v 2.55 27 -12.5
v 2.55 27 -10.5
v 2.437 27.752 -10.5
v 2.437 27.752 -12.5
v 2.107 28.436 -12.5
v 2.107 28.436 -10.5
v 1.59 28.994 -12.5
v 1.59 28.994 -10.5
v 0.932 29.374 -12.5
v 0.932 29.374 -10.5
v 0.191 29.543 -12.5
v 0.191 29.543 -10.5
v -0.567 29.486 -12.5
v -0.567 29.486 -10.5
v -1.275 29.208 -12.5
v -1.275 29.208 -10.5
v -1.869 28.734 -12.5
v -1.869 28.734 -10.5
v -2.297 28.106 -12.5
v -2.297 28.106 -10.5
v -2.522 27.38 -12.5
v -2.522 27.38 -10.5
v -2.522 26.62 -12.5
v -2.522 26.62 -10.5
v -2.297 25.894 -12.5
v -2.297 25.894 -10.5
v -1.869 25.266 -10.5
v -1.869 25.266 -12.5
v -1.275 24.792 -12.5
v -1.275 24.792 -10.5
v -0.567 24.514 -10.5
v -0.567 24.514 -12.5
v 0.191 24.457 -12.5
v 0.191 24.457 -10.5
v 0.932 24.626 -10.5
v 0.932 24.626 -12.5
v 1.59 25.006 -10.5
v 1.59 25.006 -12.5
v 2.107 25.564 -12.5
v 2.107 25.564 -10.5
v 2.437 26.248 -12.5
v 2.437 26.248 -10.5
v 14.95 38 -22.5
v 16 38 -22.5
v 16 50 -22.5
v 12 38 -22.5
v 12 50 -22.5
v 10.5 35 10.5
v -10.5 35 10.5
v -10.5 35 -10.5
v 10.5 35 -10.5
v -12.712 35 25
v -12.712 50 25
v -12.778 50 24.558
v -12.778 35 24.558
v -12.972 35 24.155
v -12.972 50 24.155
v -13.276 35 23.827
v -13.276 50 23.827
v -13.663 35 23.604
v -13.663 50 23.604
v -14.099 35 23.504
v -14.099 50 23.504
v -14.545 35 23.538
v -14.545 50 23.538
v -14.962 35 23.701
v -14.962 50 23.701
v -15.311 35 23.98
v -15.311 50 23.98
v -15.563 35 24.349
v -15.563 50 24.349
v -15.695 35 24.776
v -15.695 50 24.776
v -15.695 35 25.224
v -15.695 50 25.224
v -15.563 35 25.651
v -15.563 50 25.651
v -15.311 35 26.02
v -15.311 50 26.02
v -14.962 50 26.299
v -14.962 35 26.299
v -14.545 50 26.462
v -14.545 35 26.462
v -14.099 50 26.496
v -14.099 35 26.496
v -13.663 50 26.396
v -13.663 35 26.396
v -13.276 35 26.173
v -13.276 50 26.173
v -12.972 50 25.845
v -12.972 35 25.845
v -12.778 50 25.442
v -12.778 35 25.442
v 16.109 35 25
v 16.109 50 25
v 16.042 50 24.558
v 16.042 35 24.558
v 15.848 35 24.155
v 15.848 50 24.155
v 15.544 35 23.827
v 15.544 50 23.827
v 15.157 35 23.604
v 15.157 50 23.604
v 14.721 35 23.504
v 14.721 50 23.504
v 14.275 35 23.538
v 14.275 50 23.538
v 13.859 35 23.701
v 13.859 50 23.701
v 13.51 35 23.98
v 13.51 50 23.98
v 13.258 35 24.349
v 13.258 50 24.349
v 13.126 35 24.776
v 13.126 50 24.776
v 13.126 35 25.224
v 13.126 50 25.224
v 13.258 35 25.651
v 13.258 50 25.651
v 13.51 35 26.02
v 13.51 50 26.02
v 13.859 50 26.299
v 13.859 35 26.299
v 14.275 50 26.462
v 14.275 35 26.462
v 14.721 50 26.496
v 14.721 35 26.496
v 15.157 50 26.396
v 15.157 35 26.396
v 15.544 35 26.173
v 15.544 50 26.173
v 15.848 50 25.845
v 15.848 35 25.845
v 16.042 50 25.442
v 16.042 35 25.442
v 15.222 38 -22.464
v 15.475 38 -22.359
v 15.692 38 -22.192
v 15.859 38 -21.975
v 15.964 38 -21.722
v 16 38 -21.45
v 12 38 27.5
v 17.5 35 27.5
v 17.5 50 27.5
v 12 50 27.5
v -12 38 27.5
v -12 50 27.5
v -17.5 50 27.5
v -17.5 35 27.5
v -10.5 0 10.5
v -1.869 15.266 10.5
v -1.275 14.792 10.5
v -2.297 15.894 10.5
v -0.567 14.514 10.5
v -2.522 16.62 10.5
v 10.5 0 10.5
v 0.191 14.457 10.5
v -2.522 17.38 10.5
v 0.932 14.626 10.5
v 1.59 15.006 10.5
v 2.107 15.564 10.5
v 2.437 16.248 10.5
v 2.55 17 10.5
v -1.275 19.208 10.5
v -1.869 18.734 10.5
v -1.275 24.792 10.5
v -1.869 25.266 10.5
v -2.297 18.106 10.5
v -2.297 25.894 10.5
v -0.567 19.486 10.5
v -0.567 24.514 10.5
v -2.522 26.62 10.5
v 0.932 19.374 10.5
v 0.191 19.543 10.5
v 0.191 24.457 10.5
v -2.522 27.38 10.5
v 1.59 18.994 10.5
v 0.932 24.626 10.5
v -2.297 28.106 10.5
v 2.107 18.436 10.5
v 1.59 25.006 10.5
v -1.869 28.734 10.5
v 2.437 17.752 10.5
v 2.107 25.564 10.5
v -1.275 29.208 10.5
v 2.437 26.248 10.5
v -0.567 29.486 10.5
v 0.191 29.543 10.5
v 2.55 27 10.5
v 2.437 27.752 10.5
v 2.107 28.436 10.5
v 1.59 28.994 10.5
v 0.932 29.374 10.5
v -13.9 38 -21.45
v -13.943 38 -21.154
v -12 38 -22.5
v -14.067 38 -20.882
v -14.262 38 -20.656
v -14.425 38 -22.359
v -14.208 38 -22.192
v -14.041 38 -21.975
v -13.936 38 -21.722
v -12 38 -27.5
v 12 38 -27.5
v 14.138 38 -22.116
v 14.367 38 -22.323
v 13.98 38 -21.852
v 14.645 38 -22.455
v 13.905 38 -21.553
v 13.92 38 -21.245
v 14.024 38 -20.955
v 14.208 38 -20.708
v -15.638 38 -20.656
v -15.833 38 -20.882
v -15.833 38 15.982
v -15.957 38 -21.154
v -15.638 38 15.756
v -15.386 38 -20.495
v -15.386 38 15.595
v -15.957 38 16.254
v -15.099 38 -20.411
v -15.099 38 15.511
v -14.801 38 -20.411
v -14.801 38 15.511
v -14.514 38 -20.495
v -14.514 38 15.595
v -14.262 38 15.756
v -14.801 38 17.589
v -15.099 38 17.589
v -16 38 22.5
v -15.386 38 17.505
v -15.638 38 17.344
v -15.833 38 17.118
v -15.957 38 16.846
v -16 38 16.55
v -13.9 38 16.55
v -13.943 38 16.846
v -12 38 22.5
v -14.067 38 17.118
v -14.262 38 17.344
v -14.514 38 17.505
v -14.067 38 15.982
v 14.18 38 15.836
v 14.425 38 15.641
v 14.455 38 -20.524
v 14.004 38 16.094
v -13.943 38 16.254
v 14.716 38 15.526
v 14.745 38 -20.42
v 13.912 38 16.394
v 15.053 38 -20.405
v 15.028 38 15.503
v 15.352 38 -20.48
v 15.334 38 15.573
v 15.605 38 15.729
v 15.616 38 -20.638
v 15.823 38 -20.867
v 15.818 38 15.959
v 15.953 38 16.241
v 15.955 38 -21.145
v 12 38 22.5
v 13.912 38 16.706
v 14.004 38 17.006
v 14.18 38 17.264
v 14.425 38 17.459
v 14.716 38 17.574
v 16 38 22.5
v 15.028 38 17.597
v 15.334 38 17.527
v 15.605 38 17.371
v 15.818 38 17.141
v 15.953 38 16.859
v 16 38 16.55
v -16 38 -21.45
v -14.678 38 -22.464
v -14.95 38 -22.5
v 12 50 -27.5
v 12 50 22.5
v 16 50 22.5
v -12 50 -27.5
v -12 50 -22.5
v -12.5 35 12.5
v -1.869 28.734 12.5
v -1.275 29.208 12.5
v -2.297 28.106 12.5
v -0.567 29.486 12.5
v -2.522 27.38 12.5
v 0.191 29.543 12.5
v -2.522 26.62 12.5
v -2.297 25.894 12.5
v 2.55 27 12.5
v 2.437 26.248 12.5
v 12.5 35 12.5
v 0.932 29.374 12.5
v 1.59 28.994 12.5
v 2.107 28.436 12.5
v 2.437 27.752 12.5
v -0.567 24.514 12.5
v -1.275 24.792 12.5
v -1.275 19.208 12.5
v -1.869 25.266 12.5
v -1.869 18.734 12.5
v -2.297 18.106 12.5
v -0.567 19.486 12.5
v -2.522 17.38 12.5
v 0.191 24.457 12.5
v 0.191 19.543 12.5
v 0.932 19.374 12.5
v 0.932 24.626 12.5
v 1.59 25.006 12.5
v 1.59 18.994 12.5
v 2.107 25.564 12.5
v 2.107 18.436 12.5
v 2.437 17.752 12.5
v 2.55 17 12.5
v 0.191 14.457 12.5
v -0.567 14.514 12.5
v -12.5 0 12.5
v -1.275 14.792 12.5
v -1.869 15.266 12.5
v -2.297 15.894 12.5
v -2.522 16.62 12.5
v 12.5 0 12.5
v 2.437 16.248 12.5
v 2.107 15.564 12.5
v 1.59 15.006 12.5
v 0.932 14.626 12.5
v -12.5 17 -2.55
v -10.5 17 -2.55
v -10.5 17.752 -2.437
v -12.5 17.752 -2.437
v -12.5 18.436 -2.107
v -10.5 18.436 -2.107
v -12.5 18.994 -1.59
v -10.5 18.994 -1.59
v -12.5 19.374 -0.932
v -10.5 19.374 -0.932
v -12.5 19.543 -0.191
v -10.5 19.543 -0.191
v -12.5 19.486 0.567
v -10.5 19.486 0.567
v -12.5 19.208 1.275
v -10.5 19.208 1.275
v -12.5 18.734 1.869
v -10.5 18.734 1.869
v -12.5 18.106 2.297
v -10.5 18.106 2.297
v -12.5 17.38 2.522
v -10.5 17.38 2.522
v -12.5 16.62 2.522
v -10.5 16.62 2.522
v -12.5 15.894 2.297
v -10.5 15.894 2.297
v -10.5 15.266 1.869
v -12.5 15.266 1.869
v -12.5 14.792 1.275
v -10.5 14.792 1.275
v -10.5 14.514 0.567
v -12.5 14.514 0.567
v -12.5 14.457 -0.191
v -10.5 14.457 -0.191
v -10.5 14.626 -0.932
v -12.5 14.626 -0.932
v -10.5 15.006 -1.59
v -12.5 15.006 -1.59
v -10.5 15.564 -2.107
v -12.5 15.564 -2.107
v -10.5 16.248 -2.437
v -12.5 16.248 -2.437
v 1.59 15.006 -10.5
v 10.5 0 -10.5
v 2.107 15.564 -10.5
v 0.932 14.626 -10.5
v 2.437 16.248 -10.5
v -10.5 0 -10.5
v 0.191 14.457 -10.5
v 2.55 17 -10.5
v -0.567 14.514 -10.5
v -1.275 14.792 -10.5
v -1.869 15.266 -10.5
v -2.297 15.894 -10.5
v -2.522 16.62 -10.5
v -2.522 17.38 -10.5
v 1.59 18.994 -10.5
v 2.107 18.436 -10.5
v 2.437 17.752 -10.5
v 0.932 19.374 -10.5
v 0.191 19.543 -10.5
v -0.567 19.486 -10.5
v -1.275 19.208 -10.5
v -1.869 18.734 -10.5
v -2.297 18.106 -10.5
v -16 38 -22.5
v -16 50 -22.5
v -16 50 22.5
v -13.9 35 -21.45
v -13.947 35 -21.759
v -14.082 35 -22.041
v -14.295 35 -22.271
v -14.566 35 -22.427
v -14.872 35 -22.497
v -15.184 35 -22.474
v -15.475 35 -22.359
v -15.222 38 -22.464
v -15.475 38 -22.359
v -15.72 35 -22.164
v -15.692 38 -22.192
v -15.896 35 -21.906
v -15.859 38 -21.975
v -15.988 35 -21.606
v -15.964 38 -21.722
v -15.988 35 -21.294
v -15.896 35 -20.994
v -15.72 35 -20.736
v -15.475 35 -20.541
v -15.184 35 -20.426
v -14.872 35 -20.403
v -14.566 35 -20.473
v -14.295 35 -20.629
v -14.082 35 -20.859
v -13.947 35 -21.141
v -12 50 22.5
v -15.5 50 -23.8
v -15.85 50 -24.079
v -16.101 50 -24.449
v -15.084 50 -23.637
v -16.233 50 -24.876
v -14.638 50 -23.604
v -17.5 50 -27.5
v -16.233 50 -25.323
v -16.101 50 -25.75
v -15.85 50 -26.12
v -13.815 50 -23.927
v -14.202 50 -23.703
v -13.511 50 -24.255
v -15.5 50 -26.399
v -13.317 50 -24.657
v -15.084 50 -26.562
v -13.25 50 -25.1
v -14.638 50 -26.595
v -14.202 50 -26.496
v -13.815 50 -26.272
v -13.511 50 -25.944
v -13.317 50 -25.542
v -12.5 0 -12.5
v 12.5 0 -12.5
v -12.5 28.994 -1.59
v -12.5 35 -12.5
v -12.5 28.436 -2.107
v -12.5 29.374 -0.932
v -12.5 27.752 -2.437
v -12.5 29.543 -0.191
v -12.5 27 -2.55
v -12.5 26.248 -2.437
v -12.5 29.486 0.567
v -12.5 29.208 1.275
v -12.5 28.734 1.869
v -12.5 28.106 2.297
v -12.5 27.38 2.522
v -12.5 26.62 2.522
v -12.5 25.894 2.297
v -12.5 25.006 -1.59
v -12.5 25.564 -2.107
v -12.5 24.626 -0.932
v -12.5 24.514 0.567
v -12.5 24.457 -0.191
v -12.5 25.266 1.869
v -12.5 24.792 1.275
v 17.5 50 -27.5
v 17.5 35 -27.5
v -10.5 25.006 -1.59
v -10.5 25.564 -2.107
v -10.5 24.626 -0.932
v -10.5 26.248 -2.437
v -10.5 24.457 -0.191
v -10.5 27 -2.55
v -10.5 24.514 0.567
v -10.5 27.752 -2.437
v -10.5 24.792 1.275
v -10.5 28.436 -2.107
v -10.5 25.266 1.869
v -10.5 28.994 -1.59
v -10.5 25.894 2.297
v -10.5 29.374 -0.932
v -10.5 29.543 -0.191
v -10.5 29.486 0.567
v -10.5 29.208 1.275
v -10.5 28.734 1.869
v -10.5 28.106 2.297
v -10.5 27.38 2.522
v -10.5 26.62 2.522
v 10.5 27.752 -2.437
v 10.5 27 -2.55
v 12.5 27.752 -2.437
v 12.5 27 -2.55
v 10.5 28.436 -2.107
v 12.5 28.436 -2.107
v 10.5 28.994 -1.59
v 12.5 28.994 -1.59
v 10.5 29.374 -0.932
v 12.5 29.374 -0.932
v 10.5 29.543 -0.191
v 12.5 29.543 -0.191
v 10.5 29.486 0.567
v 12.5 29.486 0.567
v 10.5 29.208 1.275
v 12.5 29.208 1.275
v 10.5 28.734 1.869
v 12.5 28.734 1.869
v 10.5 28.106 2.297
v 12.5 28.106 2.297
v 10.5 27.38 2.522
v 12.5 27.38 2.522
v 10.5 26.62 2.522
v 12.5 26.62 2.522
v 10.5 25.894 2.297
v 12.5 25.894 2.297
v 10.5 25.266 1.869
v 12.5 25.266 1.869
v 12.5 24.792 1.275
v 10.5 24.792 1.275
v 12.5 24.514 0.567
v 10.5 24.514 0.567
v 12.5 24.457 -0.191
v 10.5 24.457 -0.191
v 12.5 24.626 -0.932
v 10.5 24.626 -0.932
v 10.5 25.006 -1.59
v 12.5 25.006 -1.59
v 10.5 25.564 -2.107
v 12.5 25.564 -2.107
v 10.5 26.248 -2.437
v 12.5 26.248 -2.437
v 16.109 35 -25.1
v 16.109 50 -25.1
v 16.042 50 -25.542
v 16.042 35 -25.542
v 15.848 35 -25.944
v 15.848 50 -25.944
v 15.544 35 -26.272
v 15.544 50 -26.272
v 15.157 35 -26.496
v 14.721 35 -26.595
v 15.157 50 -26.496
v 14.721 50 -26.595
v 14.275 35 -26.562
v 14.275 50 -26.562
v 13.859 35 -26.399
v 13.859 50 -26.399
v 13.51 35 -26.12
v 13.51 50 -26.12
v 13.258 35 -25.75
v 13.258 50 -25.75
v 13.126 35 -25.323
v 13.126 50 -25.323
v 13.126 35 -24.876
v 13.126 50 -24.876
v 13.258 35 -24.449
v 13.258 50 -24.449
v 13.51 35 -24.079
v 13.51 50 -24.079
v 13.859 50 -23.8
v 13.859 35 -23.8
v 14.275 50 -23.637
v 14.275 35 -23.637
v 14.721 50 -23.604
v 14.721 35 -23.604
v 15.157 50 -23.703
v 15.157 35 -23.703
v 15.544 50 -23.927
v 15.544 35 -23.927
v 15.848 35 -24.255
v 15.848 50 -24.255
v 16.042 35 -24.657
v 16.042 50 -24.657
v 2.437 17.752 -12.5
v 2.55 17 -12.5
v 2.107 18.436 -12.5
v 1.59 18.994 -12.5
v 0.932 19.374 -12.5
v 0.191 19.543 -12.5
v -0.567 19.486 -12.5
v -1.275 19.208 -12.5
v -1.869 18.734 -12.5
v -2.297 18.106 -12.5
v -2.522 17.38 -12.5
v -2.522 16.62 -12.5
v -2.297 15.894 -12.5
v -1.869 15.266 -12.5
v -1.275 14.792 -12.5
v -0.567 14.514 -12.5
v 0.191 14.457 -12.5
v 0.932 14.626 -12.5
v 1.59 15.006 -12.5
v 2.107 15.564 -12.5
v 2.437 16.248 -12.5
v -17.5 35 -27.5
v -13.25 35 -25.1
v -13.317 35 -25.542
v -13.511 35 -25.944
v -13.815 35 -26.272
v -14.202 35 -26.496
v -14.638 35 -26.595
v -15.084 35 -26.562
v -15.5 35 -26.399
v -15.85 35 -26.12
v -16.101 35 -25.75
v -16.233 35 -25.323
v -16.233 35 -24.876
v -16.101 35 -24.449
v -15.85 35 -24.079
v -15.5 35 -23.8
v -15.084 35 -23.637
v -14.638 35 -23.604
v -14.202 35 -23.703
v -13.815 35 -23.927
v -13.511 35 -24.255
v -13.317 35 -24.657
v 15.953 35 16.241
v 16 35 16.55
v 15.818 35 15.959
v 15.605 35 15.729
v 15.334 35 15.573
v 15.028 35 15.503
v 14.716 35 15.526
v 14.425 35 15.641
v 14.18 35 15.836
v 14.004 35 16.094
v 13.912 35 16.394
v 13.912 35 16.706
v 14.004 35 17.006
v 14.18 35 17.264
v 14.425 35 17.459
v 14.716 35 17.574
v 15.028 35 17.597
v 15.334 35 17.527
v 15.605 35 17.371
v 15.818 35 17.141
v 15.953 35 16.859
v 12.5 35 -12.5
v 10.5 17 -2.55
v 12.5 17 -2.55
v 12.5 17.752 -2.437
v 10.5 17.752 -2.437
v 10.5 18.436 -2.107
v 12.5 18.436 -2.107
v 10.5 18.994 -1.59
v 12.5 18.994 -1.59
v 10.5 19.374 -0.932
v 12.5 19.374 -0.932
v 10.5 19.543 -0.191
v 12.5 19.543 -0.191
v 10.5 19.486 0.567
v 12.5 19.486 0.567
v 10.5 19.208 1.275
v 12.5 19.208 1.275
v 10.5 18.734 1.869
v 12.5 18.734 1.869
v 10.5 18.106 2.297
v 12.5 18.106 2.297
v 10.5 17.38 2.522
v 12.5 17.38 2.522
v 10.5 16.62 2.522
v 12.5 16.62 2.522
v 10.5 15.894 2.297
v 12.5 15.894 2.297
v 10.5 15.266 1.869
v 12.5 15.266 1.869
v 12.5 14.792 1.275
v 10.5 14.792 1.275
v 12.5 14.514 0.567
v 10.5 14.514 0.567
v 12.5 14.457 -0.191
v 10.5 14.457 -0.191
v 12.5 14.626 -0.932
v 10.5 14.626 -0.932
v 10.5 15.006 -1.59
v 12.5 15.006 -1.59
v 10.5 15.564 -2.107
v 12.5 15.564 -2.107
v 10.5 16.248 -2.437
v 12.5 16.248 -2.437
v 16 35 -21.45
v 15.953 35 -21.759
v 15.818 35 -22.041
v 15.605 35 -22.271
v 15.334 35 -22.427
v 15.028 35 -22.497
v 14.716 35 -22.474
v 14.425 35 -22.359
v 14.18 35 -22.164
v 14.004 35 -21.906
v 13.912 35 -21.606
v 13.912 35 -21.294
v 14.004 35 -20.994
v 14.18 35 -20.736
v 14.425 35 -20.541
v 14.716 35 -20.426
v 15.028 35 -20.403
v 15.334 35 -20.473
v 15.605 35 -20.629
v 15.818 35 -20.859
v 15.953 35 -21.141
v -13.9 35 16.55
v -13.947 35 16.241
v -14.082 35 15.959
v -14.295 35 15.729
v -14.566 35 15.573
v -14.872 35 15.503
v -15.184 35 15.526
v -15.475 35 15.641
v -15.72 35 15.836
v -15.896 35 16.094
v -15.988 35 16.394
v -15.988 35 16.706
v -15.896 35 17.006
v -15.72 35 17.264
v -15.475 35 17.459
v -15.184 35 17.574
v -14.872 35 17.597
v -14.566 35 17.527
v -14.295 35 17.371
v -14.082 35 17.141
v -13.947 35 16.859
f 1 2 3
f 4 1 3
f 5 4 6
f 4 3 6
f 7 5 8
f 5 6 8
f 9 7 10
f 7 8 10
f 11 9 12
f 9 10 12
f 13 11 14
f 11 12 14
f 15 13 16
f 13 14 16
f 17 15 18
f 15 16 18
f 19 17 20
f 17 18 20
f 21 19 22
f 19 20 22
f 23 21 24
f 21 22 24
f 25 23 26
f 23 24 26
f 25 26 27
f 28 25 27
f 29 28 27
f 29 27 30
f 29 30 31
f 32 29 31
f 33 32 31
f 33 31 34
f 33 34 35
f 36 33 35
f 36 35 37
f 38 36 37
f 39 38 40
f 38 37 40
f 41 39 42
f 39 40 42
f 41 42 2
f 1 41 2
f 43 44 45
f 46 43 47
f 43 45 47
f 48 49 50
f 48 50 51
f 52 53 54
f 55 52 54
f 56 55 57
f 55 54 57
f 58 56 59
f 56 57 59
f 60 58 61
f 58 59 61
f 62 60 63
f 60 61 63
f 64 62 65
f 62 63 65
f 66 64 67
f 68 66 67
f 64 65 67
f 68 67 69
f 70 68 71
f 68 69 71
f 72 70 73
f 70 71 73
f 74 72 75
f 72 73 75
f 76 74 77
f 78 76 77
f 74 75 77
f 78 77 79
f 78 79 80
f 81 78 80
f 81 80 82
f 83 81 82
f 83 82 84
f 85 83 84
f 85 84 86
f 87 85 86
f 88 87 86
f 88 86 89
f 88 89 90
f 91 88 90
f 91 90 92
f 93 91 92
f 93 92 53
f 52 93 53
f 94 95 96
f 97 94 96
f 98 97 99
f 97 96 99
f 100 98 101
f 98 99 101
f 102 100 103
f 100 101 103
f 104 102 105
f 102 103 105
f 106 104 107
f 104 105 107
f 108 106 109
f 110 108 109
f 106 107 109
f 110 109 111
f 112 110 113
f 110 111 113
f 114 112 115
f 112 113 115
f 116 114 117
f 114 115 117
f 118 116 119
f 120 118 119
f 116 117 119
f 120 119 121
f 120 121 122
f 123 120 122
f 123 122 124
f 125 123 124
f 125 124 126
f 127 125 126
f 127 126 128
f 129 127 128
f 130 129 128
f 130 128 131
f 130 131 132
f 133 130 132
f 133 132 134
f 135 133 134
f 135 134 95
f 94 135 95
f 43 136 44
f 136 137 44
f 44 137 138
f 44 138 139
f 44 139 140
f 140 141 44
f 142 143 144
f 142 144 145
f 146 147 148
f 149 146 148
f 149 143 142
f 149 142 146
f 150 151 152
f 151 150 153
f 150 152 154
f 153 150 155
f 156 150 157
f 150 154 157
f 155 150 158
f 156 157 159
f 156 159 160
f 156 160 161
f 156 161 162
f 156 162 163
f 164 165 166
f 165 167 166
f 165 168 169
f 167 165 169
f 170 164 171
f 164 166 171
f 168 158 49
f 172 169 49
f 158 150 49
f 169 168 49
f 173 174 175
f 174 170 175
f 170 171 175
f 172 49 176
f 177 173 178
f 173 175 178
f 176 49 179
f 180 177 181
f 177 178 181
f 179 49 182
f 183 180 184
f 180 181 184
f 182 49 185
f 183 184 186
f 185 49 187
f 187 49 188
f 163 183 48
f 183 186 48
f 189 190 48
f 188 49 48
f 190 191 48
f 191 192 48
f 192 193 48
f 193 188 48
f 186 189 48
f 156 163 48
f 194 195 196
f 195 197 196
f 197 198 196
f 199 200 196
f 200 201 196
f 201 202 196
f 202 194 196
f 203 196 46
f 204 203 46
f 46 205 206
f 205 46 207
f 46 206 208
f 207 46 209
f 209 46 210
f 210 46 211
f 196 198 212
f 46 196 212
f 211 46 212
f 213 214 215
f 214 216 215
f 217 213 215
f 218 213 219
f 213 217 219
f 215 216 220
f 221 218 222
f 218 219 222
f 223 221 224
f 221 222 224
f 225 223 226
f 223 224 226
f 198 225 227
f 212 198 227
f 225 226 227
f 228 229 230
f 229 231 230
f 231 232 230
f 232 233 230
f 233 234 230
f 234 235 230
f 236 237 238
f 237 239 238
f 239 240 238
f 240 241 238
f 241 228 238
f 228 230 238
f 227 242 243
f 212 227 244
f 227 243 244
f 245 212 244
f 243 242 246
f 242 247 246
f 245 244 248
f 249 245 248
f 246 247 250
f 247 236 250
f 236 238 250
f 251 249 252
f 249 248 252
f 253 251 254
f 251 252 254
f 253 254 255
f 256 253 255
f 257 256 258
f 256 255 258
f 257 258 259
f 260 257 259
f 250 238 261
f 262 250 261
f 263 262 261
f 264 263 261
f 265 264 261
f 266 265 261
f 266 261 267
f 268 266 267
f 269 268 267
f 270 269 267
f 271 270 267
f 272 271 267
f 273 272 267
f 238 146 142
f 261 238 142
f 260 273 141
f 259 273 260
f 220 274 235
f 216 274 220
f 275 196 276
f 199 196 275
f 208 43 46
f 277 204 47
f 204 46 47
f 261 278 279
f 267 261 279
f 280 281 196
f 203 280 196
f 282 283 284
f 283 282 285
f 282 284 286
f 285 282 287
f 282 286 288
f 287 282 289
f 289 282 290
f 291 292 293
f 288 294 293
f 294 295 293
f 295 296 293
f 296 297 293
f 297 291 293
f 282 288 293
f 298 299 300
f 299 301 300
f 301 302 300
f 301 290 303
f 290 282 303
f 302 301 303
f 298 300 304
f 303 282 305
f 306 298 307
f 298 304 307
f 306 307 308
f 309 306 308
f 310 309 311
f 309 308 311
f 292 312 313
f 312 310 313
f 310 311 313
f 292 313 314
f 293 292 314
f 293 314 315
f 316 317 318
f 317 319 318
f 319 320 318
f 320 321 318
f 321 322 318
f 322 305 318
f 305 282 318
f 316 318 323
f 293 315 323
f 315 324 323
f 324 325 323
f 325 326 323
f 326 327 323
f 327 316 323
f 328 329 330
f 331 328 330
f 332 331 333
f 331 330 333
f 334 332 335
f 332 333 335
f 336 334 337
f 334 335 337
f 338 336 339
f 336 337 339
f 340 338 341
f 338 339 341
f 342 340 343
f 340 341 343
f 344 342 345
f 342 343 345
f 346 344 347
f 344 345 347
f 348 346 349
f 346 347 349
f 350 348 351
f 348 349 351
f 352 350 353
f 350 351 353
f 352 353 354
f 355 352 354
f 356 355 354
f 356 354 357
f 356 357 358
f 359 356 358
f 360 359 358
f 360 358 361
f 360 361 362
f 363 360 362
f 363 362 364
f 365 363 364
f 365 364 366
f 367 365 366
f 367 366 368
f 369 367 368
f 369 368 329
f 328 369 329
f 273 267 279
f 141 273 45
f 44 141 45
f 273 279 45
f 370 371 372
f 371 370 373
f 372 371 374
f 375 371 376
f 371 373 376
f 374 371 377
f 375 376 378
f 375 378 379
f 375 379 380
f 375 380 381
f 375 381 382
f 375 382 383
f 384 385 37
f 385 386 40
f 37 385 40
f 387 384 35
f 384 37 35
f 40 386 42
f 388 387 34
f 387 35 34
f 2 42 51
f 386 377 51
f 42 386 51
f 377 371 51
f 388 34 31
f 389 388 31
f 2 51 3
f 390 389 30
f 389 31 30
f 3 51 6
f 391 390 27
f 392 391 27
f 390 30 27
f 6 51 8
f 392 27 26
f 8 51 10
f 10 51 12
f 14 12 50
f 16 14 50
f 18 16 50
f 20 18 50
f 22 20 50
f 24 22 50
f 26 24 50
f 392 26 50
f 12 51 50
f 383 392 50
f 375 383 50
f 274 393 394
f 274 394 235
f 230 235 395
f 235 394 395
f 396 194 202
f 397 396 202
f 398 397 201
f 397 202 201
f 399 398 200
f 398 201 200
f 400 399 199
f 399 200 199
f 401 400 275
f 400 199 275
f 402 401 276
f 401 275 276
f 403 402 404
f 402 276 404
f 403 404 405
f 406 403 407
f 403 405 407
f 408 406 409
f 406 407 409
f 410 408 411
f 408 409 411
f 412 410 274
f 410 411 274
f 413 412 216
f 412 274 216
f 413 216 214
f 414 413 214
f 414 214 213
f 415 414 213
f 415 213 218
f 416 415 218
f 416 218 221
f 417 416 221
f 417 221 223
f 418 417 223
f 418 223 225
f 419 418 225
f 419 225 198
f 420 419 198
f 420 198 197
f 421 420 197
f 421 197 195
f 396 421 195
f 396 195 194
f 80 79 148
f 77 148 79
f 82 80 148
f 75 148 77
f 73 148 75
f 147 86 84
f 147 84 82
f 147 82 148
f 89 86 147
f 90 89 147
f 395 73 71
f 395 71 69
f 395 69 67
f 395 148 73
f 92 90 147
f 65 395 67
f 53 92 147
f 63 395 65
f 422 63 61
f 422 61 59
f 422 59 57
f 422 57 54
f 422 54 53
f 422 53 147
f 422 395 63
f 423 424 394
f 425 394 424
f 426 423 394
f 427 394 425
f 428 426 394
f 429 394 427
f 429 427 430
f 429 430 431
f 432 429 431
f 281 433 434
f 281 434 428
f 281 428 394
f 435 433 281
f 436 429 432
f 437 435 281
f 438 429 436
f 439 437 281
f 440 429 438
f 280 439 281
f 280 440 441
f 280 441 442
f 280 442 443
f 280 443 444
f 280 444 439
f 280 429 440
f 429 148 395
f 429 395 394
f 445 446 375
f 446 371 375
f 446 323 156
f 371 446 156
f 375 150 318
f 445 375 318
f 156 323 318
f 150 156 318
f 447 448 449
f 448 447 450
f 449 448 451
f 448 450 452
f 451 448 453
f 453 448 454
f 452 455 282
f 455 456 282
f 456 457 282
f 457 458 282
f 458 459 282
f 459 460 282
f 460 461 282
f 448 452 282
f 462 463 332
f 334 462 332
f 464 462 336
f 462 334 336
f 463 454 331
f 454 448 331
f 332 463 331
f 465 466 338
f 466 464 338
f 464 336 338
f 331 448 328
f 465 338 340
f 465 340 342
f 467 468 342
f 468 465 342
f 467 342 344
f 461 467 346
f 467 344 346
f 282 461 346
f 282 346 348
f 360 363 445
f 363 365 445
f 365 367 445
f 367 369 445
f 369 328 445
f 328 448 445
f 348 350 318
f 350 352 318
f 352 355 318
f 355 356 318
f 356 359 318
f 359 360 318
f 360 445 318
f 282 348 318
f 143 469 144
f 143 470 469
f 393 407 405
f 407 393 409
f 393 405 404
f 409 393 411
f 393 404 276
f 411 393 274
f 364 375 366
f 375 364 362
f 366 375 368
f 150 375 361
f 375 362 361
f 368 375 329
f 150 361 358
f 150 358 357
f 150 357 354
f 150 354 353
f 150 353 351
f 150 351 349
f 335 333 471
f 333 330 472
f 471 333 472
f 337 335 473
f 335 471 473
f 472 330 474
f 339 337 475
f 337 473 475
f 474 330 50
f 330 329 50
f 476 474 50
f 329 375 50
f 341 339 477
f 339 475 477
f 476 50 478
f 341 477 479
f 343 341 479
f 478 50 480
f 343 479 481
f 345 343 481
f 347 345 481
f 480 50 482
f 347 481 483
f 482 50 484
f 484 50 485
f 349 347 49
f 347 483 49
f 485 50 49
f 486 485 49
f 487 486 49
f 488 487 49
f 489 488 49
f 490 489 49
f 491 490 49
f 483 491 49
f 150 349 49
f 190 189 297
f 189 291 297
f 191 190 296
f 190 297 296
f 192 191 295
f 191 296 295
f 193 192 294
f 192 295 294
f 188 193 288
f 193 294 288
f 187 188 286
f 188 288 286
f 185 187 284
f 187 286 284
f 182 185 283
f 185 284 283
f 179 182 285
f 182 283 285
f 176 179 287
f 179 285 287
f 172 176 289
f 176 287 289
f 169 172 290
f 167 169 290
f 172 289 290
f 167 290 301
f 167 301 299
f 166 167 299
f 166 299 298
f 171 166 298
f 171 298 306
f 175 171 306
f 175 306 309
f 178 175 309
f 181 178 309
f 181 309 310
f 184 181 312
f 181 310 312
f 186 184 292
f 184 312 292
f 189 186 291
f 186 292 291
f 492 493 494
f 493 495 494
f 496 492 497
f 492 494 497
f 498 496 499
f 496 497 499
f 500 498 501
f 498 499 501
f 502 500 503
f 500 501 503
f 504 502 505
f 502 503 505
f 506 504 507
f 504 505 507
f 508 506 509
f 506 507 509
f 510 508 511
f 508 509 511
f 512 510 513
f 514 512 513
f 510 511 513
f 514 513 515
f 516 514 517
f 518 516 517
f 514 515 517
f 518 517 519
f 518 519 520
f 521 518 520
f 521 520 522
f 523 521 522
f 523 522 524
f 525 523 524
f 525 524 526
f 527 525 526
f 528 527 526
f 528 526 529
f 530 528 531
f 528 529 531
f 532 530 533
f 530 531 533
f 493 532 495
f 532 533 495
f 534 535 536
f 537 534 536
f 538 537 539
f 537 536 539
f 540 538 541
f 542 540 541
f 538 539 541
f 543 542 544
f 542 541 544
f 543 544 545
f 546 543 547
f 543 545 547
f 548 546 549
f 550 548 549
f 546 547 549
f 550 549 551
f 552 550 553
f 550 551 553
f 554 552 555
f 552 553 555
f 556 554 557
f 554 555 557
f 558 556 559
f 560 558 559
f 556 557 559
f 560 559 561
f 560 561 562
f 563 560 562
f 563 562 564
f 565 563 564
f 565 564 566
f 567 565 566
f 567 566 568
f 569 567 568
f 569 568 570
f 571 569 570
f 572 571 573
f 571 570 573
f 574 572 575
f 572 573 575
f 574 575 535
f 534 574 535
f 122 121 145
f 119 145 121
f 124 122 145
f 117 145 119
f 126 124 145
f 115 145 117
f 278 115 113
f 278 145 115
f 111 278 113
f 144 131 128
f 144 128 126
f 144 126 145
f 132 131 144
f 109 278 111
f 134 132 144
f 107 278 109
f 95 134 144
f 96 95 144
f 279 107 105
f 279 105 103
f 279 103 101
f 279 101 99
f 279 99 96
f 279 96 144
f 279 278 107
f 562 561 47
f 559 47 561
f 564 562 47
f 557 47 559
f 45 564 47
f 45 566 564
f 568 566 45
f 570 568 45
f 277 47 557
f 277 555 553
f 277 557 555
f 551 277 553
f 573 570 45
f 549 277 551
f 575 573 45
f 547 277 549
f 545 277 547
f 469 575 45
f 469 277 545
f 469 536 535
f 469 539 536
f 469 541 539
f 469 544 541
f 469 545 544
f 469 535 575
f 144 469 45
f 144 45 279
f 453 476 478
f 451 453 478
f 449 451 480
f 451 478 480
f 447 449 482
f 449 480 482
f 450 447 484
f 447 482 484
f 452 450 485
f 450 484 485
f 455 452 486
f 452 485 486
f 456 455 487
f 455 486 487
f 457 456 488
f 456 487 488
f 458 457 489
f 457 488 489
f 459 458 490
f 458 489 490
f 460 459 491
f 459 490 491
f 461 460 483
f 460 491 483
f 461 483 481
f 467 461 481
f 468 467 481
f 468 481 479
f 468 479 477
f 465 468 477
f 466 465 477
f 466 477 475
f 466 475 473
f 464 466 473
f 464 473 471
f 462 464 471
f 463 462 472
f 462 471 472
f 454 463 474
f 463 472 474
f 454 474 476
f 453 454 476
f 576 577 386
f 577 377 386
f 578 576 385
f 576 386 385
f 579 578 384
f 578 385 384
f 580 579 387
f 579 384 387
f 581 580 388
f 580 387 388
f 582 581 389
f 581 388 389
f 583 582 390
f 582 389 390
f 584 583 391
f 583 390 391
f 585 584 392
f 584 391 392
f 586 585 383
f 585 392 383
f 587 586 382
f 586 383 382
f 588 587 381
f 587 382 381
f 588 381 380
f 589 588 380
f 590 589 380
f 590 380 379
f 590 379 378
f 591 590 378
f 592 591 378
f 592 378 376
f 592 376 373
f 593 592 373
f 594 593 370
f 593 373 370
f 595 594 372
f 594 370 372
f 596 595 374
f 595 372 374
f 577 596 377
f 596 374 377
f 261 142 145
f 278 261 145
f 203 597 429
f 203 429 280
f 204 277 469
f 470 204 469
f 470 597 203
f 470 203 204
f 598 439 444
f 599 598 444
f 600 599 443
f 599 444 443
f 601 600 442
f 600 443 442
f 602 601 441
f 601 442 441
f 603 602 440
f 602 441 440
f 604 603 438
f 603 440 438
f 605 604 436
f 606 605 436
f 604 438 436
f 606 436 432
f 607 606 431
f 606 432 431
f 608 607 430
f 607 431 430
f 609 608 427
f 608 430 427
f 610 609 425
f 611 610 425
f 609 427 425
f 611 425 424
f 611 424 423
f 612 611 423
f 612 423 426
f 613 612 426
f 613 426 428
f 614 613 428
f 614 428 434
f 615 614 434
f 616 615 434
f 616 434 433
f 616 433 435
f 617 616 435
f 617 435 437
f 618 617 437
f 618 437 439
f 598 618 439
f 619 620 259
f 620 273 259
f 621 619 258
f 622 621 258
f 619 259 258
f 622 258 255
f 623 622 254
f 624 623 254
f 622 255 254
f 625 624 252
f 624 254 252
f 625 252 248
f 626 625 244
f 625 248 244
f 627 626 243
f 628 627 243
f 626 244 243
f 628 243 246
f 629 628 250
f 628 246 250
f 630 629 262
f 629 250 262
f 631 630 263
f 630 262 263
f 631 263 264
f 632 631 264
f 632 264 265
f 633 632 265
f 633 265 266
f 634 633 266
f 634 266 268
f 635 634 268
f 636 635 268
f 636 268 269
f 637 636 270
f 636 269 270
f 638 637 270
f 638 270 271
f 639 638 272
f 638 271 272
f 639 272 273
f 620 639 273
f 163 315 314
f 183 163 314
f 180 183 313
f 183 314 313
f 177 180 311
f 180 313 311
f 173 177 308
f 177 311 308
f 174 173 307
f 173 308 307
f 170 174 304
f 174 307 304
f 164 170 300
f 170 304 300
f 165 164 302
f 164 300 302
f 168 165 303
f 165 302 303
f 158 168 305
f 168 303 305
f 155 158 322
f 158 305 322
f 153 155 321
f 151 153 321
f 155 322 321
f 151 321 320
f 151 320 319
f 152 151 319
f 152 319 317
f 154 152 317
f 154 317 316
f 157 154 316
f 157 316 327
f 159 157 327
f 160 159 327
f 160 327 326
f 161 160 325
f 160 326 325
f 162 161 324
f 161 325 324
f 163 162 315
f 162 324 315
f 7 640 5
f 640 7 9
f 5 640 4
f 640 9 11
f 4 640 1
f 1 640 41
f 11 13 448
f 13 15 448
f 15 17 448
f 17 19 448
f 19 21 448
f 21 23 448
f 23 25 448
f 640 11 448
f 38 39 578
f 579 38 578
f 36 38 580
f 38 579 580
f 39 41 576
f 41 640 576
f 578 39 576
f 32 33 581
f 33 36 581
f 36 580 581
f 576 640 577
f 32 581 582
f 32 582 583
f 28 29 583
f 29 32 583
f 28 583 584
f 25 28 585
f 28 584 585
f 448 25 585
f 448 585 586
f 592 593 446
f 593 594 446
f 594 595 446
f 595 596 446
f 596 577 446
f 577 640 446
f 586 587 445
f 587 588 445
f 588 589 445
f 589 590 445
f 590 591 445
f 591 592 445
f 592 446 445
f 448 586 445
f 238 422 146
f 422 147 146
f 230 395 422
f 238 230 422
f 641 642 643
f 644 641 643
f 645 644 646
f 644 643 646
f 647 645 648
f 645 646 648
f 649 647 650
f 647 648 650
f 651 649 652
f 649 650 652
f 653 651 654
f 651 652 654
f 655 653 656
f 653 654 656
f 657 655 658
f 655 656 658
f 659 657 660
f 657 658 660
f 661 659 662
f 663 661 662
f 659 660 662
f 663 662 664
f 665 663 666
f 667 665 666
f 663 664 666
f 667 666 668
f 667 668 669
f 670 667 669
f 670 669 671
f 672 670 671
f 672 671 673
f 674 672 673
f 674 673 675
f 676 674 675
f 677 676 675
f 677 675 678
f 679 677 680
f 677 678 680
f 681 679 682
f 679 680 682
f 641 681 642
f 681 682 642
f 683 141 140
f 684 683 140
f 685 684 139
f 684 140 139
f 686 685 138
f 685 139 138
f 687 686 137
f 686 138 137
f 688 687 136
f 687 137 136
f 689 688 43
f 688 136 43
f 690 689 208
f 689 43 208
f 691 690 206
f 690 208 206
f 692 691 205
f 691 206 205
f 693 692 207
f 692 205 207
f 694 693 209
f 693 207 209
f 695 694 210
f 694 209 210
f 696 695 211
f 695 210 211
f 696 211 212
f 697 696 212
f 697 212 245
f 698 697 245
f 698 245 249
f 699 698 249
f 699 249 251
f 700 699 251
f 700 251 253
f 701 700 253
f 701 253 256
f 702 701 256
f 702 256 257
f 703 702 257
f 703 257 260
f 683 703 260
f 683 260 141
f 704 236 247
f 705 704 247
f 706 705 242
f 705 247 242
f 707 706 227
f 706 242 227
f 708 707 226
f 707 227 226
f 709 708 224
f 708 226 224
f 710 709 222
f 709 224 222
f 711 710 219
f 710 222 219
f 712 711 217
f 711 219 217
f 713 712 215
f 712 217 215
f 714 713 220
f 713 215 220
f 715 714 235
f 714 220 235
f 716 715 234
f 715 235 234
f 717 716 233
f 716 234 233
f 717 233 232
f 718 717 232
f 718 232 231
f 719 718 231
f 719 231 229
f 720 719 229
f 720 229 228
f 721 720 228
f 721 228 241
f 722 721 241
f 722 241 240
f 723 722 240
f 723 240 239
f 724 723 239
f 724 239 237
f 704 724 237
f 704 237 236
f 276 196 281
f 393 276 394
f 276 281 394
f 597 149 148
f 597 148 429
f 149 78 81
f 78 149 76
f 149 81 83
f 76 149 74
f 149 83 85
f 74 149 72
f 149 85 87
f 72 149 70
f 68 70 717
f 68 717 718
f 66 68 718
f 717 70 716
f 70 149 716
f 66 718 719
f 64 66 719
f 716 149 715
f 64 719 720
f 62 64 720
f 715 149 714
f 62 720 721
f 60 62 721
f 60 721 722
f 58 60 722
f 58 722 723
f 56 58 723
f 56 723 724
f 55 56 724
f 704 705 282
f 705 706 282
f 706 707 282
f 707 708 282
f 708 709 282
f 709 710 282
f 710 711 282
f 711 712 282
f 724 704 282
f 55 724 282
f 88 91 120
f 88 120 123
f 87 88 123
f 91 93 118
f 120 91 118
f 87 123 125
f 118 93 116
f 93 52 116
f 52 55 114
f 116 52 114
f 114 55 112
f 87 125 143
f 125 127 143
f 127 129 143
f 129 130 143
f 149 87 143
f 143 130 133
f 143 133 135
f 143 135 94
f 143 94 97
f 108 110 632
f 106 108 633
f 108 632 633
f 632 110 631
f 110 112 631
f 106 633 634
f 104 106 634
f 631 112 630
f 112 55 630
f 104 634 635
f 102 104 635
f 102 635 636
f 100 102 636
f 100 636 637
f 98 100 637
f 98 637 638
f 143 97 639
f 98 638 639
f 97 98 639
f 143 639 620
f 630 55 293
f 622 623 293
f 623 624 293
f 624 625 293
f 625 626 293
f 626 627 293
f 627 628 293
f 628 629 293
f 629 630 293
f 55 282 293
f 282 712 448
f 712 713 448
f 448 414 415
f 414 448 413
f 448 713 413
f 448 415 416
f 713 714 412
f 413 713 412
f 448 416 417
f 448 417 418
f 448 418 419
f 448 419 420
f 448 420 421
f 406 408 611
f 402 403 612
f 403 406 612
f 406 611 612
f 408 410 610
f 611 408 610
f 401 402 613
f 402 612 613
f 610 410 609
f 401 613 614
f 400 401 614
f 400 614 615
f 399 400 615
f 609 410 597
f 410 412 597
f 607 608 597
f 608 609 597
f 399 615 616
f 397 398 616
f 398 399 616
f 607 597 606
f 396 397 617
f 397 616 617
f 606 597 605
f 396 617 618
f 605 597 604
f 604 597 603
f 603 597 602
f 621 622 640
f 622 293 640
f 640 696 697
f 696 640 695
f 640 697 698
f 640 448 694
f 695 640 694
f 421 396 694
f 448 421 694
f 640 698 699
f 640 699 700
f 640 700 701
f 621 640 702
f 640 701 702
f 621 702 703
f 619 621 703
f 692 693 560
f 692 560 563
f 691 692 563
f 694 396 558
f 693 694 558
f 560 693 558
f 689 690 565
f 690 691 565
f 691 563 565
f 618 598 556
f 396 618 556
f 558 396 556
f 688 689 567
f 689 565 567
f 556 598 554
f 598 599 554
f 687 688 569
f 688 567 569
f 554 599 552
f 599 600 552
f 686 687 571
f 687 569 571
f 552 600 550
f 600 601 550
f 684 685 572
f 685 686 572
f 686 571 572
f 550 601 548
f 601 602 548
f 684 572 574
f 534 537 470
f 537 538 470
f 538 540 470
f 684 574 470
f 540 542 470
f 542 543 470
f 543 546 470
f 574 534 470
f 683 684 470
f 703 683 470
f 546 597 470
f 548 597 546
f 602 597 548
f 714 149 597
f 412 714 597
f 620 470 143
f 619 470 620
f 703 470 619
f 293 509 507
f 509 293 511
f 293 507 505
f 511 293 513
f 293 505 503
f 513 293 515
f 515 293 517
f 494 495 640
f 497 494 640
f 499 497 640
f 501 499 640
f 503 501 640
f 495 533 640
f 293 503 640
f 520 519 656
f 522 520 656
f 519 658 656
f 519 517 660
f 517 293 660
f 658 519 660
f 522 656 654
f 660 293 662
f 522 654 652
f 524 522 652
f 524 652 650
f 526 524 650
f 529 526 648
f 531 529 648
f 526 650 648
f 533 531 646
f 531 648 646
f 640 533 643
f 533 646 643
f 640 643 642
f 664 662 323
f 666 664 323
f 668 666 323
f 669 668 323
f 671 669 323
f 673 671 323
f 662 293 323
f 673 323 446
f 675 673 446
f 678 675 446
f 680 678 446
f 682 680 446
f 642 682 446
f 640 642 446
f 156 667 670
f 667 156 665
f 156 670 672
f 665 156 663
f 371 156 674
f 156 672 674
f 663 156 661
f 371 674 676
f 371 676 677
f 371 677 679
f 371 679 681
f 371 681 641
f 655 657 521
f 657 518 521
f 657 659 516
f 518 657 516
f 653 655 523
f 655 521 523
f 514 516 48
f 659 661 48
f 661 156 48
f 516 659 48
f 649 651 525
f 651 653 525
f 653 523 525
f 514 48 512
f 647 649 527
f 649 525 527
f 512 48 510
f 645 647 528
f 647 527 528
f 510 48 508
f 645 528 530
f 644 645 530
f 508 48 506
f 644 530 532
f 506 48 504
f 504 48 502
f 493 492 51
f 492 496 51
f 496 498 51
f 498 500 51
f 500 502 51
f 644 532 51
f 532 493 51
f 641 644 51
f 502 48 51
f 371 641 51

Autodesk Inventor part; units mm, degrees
ref_plane "YZ Plane" through (0, 0, 0) normal (1, 0, 0) x (0, 1, 0)
ref_plane "XZ Plane" through (0, 0, 0) normal (0, 1, 0) x (-1, 0, 0)
ref_plane "XY Plane" through (0, 0, 0) normal (0, 0, 1) x (1, 0, 0)
sketch "草圖1" plane through (0, 0, 0) normal (0, 1, 0) x (-1, 0, 0)
  line L0 (12.5, 12.5) -> (-12.5, 12.5)
  line L1 (-12.5, 12.5) -> (-12.5, -12.5)
  line L2 (-12.5, -12.5) -> (12.5, -12.5)
  line L3 (12.5, -12.5) -> (12.5, 12.5)
  line L4 (12.5, 12.5) -> (-12.5, -12.5) construction
  line L5 (-12.5, 12.5) -> (12.5, -12.5) construction
  point P0 (0, 0)
  dimension "d0" = 25
  dimension "d1" = 25
extrude "擠出1" add sketch "草圖1" along normal blind 35
sketch "草圖2" plane through (0, 35, 0) normal (0, 1, 0) x (1, 0, 0)
  line L0 (-10.5, -10.5) -> (10.5, -10.5)
  line L1 (10.5, -10.5) -> (10.5, 10.5)
  line L2 (10.5, 10.5) -> (-10.5, 10.5)
  line L3 (-10.5, 10.5) -> (-10.5, -10.5)
  line L4 (-10.5, -10.5) -> (10.5, 10.5) construction
  line L5 (10.5, -10.5) -> (-10.5, 10.5) construction
  point P0 (0, 0)
  dimension "d4" = 21
  dimension "d5" = 21
extrude "擠出2" cut sketch "草圖2" against normal through all
sketch "草圖3" plane through (-12.5, 0, 12.5) normal (0, 0, 1) x (1, 0, 0)
  line L0 (2, 35) -> (23, 35) projected
  line L1 (12.5, 35) -> (12.5, 0)
  circle A0 centre (12.5, 17) radius 2.55
  circle A1 centre (12.5, 27) radius 2.55
  line L2 (0, 0) -> (25, 0) projected
  point P0 (12.5, 0)
  dimension "d8" = 5.1
  dimension "d9" = 5.1
  dimension "d10" = 10
  dimension "d11" = 17
extrude "擠出3" cut sketch "草圖3" against normal through all
sketch "草圖4" plane through (0, 35, 0) normal (0, 1, 0) x (1, 0, 0)
  line L0 (-17.5, 27.5) -> (17.5, 27.5)
  line L1 (17.5, 27.5) -> (17.5, -27.5)
  line L2 (17.5, -27.5) -> (-17.5, -27.5)
  line L3 (-17.5, -27.5) -> (-17.5, 27.5)
  line L4 (-17.5, 27.5) -> (17.5, -27.5) construction
  line L5 (17.5, 27.5) -> (-17.5, -27.5) construction
  point P0 (0, 0)
  dimension "d14" = 55
  dimension "d15" = 35
extrude "擠出4" add sketch "草圖4" along normal blind 15
sketch "草圖5" plane through (0, 50, 0) normal (0, 1, 0) x (1, 0, 0)
  line L0 (-16, -22.5) -> (16, -22.5)
  line L1 (16, -22.5) -> (16, 22.5)
  line L2 (16, 22.5) -> (-16, 22.5)
  line L3 (-16, 22.5) -> (-16, -22.5)
  line L4 (-16, -22.5) -> (16, 22.5) construction
  line L5 (16, -22.5) -> (-16, 22.5) construction
  point P0 (0, 0)
  dimension "d18" = 45
  dimension "d19" = 32
extrude "擠出5" cut sketch "草圖5" against normal blind 12
sketch "草圖6" plane through (-17.5, 35, 27.5) normal (0, 0, 1) x (1, 0, 0)
  line L0 (0, 0) -> (0, 15) projected
  line L1 (0, 7.5) -> (35, 7.5)
  line L2 (35, 0) -> (35, 15) projected
  arc A0 (5.5, 7.5) -> (14.5, 7.5) centre (10, 7.5) ccw
  arc A1 (20.5, 7.5) -> (29.5, 7.5) centre (25, 7.5) ccw
  line L3 (35, 15) -> (0, 15) projected
  line L4 (17.5, 15) -> (17.5, 0)
  line L5 (0, 0) -> (35, 0) projected
  line L6 (5.5, 7.5) -> (14.5, 7.5)
  line L7 (14.5, 7.5) -> (14.5, 15)
  line L8 (14.5, 15) -> (5.5, 15)
  line L9 (5.5, 15) -> (5.5, 7.5)
  line L10 (20.5, 7.5) -> (29.5, 7.5)
  line L11 (29.5, 7.5) -> (29.5, 15)
  line L12 (29.5, 15) -> (20.5, 15)
  line L13 (20.5, 15) -> (20.5, 7.5)
  line L14 (14.5, 7.5) -> (20.5, 7.5)
  line L15 (1.5, 3) -> (33.5, 3) projected
  line L16 (5.5, 15) -> (29.5, 15)
  line L17 (29.5, 15) -> (29.5, 3)
  line L18 (29.5, 3) -> (5.5, 3)
  line L19 (5.5, 3) -> (5.5, 15)
  point P0 (17.5, -35)
  point P1 (20.5, 15)
  point P2 (29.5, 7.5)
  point P3 (28.5, 7.5)
  point P4 (29.5, 7.5)
  point P5 (5.5, 15)
  point P6 (14.5, 7.5)
  point P7 (13.5, 7.5)
  point P8 (25, 3)
  point P9 (10, 3)
  point P10 (25, 3)
  point P11 (29.5, 7.5)
  point P12 (5.5, 7.5)
  point P13 (5.5, 7.5)
  point P14 (29.5, 7.5)
  dimension "d22" = 9
  dimension "d23" = 9
  dimension "d24" = 15
  dimension "d25" = 7.5
  dimension "d52" = 24
extrude "擠出8" cut sketch "草圖6" against normal through all contours L9 L3 L7 L1 | L1 A0 | A0 L15 L19 | L15 A0 L1 L4 | L4 L1 A1 L15 | L7 L3 L4 L1 | L4 L3 L13 L1 | A1 L1 | A1 L17 L15 | L13 L3 L11 L1
sketch "草圖9" plane through (0, 50, 0) normal (0, 1, 0) x (1, 0, 0)
  circle A0 centre (-14.2115, -25) radius 1.5
  circle A1 centre (14.6091, -25) radius 1.5
  circle A2 centre (14.6091, 25.0995) radius 1.5
  circle A3 centre (-14.75, 25.0995) radius 1.5
  line L0 (-12, -27.5) -> (-12, -22.5) projected
  line L1 (-12, -25) -> (-17.5, -25)
  line L2 (-17.5, 27.5) -> (-17.5, -27.5) projected
  line L3 (17.5, -27.5) -> (17.5, 27.5) projected
  line L4 (17.5, -25) -> (-17.5, -25)
  line L5 (-17.5, 25.0938) -> (17.5, 25.0938)
  line L6 (14.6091, -25) -> (14.6091, 25.0995)
  line L7 (17.5, 27.5) -> (12, 27.5) projected
  line L8 (14.6091, 25.0995) -> (-14.75, 25.0995)
  line L9 (-14.75, 25.0995) -> (-14.75, -25)
  point P0 (0, 0)
  dimension "d34" = 3
  dimension "d35" = 3
  dimension "d36" = 3
  dimension "d37" = 3
  dimension "d38" = 0
  dimension "d39" = 0
extrude "擠出9" cut sketch "草圖9" against normal blind 15 contours L1 L9 A0 | A0 L1 | L9 L1 A0 | L9 L5 A3 | A3 L5 L9 | L4 A1 | A1 L6 L4 | A3 L8 L9 L5 | L5 L9 L8 A3 | L8 L6 L5 | A2 L5 L6 L8 | L5 L6 A2 | A1 L4 L6 | L6 L5 A2
sketch "草圖11" plane through (12.5, 0, 12.5) normal (1, 0, 0) x (0, 0, -1)
  circle A0 centre (12.5, 27) radius 2.55
  circle A1 centre (12.5, 17) radius 2.55
  line L0 (0, 0) -> (25, 0) projected
  point P0 (12.5, 0)
  point P1 (12.5, 0)
  dimension "d46" = 5.1
  dimension "d47" = 5.1
  dimension "d48" = 17
  dimension "d49" = 10
extrude "擠出11" cut sketch "草圖11" against normal up to surface (25 mm away)
sketch "草圖12" plane through (0, 38, 0) normal (0, 1, 0) x (1, 0, 0)
  circle A0 centre (-14.95, 21.45) radius 1.05
  circle A1 centre (14.95, 21.45) radius 1.05
  line L0 (-16, 22.5) -> (-12, 22.5) projected
  line L1 (-16, -22.5) -> (-16, 22.5) projected
  line L2 (12, 22.5) -> (16, 22.5) projected
  line L3 (16, 22.5) -> (16, -22.5) projected
  circle A2 centre (-14.95, -16.55) radius 1.05
  circle A3 centre (14.95, -16.55) radius 1.05
  point P0 (0, 0)
  dimension "d53" = 2.1
  dimension "d54" = 2.1
  dimension "d55" = 2.1
  dimension "d56" = 2.1
  dimension "d57" = 38
  dimension "d58" = 38
extrude "擠出12" cut sketch "草圖12" against normal up to surface (3 mm away) contours A0 | A2 | A1 | A3
